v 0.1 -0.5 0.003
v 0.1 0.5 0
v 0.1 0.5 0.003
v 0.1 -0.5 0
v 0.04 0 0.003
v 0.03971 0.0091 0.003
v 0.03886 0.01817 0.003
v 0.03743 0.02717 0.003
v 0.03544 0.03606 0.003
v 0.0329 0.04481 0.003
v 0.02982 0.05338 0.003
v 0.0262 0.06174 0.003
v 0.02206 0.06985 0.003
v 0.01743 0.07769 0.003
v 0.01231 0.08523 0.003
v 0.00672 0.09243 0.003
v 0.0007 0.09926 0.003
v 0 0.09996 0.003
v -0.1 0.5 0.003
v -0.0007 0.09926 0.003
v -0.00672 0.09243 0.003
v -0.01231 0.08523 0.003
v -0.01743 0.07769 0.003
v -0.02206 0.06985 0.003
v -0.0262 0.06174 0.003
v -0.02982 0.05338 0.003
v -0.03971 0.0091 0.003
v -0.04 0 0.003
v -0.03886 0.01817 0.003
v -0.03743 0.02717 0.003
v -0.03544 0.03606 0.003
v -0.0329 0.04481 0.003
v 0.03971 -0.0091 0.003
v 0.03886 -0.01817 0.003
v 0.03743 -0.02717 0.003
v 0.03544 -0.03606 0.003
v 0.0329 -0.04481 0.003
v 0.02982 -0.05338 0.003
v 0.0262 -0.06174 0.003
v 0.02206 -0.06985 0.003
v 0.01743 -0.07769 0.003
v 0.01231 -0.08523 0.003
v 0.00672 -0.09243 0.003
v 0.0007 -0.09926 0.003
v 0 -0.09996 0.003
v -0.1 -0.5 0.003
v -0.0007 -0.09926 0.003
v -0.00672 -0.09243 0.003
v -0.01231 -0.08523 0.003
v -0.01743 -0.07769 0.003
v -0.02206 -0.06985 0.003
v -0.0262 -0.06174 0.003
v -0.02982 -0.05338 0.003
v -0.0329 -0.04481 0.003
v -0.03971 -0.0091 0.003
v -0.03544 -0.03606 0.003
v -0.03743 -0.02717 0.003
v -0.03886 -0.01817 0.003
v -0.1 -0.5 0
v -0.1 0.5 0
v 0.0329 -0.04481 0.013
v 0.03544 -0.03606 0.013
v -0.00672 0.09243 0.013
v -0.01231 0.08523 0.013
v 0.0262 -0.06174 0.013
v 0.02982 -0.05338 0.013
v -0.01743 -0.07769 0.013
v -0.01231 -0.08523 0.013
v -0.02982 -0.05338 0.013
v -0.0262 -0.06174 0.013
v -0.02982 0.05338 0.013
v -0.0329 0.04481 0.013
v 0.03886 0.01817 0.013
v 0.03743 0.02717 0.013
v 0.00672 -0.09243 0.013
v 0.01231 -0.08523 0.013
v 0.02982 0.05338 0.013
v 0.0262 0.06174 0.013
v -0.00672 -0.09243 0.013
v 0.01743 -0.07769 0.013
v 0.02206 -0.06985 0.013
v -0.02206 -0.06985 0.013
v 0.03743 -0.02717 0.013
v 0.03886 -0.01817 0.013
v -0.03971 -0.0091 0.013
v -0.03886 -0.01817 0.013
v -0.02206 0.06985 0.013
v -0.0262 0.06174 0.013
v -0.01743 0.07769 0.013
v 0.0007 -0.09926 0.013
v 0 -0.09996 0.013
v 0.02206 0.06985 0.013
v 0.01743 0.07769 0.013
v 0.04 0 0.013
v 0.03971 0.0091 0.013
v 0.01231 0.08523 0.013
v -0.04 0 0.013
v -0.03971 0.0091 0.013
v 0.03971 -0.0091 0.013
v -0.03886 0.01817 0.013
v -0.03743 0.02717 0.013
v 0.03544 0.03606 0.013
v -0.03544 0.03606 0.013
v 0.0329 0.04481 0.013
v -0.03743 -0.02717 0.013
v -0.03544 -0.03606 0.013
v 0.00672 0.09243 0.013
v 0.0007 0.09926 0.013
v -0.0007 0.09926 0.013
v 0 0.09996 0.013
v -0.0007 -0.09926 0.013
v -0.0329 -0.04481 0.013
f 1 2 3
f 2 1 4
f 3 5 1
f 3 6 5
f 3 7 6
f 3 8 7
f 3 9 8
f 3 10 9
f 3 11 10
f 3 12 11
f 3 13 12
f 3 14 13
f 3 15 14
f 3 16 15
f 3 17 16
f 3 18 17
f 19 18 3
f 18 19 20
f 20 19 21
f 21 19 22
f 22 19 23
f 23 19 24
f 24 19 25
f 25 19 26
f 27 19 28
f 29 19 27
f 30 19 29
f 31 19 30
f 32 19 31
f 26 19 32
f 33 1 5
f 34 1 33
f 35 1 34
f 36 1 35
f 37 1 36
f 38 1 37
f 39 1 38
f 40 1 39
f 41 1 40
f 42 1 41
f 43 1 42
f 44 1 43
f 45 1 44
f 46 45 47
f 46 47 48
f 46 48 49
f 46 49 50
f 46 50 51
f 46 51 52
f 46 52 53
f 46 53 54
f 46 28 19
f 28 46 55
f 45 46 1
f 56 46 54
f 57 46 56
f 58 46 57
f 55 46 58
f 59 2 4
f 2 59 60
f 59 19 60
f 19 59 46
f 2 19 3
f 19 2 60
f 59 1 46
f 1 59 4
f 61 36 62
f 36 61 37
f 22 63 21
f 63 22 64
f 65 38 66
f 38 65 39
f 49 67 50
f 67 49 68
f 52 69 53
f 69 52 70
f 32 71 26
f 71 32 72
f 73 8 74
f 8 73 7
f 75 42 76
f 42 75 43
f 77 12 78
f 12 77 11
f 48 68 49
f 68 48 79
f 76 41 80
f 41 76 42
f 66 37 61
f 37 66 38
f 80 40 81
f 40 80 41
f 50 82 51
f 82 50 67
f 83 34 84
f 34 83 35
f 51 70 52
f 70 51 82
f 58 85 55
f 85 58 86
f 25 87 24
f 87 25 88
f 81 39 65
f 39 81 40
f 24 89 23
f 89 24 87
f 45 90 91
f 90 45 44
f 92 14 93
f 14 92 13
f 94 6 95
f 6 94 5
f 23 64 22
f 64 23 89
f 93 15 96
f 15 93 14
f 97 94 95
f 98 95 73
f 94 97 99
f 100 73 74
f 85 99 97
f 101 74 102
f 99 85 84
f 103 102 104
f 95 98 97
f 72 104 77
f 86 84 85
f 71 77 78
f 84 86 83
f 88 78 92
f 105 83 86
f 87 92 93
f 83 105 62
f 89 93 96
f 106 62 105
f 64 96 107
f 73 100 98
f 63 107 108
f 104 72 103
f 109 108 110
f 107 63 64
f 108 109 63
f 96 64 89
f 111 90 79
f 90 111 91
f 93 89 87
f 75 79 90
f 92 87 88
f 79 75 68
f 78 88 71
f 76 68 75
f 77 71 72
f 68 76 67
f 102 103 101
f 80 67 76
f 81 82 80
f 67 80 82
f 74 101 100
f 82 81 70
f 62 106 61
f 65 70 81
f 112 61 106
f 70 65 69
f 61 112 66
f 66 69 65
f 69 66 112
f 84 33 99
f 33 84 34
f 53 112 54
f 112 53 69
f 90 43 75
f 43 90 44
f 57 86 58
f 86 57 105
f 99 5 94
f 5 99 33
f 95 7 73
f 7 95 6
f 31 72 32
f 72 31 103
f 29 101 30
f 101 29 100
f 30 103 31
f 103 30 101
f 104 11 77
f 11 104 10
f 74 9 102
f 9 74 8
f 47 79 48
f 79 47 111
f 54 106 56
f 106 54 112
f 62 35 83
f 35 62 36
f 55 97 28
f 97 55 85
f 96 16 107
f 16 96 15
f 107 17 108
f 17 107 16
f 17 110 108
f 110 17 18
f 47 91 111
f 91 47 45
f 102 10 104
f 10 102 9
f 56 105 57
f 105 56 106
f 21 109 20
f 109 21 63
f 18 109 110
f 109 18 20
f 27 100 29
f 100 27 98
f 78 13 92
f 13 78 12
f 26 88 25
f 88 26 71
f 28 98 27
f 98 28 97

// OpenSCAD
// Double sided teardrop on a plate
plate_x = 200;
plate_y = 1000;
plate_z = 3;
protrusion_h = 10;

$fn = 100;

scale([0.001, 0.001, 0.001]) union() {
    // Base plate
    translate([-plate_x/2, -plate_y/2, 0])
        cube([plate_x, plate_y, plate_z]);
        
    // Double-sided teardrop (biconvex lens shape)
    translate([0, 0, plate_z]) {
        linear_extrude(height = protrusion_h) {
            intersection() {
                translate([105, 0, 0]) circle(r=145);
                translate([-105, 0, 0]) circle(r=145);
            }
        }
    }
}
